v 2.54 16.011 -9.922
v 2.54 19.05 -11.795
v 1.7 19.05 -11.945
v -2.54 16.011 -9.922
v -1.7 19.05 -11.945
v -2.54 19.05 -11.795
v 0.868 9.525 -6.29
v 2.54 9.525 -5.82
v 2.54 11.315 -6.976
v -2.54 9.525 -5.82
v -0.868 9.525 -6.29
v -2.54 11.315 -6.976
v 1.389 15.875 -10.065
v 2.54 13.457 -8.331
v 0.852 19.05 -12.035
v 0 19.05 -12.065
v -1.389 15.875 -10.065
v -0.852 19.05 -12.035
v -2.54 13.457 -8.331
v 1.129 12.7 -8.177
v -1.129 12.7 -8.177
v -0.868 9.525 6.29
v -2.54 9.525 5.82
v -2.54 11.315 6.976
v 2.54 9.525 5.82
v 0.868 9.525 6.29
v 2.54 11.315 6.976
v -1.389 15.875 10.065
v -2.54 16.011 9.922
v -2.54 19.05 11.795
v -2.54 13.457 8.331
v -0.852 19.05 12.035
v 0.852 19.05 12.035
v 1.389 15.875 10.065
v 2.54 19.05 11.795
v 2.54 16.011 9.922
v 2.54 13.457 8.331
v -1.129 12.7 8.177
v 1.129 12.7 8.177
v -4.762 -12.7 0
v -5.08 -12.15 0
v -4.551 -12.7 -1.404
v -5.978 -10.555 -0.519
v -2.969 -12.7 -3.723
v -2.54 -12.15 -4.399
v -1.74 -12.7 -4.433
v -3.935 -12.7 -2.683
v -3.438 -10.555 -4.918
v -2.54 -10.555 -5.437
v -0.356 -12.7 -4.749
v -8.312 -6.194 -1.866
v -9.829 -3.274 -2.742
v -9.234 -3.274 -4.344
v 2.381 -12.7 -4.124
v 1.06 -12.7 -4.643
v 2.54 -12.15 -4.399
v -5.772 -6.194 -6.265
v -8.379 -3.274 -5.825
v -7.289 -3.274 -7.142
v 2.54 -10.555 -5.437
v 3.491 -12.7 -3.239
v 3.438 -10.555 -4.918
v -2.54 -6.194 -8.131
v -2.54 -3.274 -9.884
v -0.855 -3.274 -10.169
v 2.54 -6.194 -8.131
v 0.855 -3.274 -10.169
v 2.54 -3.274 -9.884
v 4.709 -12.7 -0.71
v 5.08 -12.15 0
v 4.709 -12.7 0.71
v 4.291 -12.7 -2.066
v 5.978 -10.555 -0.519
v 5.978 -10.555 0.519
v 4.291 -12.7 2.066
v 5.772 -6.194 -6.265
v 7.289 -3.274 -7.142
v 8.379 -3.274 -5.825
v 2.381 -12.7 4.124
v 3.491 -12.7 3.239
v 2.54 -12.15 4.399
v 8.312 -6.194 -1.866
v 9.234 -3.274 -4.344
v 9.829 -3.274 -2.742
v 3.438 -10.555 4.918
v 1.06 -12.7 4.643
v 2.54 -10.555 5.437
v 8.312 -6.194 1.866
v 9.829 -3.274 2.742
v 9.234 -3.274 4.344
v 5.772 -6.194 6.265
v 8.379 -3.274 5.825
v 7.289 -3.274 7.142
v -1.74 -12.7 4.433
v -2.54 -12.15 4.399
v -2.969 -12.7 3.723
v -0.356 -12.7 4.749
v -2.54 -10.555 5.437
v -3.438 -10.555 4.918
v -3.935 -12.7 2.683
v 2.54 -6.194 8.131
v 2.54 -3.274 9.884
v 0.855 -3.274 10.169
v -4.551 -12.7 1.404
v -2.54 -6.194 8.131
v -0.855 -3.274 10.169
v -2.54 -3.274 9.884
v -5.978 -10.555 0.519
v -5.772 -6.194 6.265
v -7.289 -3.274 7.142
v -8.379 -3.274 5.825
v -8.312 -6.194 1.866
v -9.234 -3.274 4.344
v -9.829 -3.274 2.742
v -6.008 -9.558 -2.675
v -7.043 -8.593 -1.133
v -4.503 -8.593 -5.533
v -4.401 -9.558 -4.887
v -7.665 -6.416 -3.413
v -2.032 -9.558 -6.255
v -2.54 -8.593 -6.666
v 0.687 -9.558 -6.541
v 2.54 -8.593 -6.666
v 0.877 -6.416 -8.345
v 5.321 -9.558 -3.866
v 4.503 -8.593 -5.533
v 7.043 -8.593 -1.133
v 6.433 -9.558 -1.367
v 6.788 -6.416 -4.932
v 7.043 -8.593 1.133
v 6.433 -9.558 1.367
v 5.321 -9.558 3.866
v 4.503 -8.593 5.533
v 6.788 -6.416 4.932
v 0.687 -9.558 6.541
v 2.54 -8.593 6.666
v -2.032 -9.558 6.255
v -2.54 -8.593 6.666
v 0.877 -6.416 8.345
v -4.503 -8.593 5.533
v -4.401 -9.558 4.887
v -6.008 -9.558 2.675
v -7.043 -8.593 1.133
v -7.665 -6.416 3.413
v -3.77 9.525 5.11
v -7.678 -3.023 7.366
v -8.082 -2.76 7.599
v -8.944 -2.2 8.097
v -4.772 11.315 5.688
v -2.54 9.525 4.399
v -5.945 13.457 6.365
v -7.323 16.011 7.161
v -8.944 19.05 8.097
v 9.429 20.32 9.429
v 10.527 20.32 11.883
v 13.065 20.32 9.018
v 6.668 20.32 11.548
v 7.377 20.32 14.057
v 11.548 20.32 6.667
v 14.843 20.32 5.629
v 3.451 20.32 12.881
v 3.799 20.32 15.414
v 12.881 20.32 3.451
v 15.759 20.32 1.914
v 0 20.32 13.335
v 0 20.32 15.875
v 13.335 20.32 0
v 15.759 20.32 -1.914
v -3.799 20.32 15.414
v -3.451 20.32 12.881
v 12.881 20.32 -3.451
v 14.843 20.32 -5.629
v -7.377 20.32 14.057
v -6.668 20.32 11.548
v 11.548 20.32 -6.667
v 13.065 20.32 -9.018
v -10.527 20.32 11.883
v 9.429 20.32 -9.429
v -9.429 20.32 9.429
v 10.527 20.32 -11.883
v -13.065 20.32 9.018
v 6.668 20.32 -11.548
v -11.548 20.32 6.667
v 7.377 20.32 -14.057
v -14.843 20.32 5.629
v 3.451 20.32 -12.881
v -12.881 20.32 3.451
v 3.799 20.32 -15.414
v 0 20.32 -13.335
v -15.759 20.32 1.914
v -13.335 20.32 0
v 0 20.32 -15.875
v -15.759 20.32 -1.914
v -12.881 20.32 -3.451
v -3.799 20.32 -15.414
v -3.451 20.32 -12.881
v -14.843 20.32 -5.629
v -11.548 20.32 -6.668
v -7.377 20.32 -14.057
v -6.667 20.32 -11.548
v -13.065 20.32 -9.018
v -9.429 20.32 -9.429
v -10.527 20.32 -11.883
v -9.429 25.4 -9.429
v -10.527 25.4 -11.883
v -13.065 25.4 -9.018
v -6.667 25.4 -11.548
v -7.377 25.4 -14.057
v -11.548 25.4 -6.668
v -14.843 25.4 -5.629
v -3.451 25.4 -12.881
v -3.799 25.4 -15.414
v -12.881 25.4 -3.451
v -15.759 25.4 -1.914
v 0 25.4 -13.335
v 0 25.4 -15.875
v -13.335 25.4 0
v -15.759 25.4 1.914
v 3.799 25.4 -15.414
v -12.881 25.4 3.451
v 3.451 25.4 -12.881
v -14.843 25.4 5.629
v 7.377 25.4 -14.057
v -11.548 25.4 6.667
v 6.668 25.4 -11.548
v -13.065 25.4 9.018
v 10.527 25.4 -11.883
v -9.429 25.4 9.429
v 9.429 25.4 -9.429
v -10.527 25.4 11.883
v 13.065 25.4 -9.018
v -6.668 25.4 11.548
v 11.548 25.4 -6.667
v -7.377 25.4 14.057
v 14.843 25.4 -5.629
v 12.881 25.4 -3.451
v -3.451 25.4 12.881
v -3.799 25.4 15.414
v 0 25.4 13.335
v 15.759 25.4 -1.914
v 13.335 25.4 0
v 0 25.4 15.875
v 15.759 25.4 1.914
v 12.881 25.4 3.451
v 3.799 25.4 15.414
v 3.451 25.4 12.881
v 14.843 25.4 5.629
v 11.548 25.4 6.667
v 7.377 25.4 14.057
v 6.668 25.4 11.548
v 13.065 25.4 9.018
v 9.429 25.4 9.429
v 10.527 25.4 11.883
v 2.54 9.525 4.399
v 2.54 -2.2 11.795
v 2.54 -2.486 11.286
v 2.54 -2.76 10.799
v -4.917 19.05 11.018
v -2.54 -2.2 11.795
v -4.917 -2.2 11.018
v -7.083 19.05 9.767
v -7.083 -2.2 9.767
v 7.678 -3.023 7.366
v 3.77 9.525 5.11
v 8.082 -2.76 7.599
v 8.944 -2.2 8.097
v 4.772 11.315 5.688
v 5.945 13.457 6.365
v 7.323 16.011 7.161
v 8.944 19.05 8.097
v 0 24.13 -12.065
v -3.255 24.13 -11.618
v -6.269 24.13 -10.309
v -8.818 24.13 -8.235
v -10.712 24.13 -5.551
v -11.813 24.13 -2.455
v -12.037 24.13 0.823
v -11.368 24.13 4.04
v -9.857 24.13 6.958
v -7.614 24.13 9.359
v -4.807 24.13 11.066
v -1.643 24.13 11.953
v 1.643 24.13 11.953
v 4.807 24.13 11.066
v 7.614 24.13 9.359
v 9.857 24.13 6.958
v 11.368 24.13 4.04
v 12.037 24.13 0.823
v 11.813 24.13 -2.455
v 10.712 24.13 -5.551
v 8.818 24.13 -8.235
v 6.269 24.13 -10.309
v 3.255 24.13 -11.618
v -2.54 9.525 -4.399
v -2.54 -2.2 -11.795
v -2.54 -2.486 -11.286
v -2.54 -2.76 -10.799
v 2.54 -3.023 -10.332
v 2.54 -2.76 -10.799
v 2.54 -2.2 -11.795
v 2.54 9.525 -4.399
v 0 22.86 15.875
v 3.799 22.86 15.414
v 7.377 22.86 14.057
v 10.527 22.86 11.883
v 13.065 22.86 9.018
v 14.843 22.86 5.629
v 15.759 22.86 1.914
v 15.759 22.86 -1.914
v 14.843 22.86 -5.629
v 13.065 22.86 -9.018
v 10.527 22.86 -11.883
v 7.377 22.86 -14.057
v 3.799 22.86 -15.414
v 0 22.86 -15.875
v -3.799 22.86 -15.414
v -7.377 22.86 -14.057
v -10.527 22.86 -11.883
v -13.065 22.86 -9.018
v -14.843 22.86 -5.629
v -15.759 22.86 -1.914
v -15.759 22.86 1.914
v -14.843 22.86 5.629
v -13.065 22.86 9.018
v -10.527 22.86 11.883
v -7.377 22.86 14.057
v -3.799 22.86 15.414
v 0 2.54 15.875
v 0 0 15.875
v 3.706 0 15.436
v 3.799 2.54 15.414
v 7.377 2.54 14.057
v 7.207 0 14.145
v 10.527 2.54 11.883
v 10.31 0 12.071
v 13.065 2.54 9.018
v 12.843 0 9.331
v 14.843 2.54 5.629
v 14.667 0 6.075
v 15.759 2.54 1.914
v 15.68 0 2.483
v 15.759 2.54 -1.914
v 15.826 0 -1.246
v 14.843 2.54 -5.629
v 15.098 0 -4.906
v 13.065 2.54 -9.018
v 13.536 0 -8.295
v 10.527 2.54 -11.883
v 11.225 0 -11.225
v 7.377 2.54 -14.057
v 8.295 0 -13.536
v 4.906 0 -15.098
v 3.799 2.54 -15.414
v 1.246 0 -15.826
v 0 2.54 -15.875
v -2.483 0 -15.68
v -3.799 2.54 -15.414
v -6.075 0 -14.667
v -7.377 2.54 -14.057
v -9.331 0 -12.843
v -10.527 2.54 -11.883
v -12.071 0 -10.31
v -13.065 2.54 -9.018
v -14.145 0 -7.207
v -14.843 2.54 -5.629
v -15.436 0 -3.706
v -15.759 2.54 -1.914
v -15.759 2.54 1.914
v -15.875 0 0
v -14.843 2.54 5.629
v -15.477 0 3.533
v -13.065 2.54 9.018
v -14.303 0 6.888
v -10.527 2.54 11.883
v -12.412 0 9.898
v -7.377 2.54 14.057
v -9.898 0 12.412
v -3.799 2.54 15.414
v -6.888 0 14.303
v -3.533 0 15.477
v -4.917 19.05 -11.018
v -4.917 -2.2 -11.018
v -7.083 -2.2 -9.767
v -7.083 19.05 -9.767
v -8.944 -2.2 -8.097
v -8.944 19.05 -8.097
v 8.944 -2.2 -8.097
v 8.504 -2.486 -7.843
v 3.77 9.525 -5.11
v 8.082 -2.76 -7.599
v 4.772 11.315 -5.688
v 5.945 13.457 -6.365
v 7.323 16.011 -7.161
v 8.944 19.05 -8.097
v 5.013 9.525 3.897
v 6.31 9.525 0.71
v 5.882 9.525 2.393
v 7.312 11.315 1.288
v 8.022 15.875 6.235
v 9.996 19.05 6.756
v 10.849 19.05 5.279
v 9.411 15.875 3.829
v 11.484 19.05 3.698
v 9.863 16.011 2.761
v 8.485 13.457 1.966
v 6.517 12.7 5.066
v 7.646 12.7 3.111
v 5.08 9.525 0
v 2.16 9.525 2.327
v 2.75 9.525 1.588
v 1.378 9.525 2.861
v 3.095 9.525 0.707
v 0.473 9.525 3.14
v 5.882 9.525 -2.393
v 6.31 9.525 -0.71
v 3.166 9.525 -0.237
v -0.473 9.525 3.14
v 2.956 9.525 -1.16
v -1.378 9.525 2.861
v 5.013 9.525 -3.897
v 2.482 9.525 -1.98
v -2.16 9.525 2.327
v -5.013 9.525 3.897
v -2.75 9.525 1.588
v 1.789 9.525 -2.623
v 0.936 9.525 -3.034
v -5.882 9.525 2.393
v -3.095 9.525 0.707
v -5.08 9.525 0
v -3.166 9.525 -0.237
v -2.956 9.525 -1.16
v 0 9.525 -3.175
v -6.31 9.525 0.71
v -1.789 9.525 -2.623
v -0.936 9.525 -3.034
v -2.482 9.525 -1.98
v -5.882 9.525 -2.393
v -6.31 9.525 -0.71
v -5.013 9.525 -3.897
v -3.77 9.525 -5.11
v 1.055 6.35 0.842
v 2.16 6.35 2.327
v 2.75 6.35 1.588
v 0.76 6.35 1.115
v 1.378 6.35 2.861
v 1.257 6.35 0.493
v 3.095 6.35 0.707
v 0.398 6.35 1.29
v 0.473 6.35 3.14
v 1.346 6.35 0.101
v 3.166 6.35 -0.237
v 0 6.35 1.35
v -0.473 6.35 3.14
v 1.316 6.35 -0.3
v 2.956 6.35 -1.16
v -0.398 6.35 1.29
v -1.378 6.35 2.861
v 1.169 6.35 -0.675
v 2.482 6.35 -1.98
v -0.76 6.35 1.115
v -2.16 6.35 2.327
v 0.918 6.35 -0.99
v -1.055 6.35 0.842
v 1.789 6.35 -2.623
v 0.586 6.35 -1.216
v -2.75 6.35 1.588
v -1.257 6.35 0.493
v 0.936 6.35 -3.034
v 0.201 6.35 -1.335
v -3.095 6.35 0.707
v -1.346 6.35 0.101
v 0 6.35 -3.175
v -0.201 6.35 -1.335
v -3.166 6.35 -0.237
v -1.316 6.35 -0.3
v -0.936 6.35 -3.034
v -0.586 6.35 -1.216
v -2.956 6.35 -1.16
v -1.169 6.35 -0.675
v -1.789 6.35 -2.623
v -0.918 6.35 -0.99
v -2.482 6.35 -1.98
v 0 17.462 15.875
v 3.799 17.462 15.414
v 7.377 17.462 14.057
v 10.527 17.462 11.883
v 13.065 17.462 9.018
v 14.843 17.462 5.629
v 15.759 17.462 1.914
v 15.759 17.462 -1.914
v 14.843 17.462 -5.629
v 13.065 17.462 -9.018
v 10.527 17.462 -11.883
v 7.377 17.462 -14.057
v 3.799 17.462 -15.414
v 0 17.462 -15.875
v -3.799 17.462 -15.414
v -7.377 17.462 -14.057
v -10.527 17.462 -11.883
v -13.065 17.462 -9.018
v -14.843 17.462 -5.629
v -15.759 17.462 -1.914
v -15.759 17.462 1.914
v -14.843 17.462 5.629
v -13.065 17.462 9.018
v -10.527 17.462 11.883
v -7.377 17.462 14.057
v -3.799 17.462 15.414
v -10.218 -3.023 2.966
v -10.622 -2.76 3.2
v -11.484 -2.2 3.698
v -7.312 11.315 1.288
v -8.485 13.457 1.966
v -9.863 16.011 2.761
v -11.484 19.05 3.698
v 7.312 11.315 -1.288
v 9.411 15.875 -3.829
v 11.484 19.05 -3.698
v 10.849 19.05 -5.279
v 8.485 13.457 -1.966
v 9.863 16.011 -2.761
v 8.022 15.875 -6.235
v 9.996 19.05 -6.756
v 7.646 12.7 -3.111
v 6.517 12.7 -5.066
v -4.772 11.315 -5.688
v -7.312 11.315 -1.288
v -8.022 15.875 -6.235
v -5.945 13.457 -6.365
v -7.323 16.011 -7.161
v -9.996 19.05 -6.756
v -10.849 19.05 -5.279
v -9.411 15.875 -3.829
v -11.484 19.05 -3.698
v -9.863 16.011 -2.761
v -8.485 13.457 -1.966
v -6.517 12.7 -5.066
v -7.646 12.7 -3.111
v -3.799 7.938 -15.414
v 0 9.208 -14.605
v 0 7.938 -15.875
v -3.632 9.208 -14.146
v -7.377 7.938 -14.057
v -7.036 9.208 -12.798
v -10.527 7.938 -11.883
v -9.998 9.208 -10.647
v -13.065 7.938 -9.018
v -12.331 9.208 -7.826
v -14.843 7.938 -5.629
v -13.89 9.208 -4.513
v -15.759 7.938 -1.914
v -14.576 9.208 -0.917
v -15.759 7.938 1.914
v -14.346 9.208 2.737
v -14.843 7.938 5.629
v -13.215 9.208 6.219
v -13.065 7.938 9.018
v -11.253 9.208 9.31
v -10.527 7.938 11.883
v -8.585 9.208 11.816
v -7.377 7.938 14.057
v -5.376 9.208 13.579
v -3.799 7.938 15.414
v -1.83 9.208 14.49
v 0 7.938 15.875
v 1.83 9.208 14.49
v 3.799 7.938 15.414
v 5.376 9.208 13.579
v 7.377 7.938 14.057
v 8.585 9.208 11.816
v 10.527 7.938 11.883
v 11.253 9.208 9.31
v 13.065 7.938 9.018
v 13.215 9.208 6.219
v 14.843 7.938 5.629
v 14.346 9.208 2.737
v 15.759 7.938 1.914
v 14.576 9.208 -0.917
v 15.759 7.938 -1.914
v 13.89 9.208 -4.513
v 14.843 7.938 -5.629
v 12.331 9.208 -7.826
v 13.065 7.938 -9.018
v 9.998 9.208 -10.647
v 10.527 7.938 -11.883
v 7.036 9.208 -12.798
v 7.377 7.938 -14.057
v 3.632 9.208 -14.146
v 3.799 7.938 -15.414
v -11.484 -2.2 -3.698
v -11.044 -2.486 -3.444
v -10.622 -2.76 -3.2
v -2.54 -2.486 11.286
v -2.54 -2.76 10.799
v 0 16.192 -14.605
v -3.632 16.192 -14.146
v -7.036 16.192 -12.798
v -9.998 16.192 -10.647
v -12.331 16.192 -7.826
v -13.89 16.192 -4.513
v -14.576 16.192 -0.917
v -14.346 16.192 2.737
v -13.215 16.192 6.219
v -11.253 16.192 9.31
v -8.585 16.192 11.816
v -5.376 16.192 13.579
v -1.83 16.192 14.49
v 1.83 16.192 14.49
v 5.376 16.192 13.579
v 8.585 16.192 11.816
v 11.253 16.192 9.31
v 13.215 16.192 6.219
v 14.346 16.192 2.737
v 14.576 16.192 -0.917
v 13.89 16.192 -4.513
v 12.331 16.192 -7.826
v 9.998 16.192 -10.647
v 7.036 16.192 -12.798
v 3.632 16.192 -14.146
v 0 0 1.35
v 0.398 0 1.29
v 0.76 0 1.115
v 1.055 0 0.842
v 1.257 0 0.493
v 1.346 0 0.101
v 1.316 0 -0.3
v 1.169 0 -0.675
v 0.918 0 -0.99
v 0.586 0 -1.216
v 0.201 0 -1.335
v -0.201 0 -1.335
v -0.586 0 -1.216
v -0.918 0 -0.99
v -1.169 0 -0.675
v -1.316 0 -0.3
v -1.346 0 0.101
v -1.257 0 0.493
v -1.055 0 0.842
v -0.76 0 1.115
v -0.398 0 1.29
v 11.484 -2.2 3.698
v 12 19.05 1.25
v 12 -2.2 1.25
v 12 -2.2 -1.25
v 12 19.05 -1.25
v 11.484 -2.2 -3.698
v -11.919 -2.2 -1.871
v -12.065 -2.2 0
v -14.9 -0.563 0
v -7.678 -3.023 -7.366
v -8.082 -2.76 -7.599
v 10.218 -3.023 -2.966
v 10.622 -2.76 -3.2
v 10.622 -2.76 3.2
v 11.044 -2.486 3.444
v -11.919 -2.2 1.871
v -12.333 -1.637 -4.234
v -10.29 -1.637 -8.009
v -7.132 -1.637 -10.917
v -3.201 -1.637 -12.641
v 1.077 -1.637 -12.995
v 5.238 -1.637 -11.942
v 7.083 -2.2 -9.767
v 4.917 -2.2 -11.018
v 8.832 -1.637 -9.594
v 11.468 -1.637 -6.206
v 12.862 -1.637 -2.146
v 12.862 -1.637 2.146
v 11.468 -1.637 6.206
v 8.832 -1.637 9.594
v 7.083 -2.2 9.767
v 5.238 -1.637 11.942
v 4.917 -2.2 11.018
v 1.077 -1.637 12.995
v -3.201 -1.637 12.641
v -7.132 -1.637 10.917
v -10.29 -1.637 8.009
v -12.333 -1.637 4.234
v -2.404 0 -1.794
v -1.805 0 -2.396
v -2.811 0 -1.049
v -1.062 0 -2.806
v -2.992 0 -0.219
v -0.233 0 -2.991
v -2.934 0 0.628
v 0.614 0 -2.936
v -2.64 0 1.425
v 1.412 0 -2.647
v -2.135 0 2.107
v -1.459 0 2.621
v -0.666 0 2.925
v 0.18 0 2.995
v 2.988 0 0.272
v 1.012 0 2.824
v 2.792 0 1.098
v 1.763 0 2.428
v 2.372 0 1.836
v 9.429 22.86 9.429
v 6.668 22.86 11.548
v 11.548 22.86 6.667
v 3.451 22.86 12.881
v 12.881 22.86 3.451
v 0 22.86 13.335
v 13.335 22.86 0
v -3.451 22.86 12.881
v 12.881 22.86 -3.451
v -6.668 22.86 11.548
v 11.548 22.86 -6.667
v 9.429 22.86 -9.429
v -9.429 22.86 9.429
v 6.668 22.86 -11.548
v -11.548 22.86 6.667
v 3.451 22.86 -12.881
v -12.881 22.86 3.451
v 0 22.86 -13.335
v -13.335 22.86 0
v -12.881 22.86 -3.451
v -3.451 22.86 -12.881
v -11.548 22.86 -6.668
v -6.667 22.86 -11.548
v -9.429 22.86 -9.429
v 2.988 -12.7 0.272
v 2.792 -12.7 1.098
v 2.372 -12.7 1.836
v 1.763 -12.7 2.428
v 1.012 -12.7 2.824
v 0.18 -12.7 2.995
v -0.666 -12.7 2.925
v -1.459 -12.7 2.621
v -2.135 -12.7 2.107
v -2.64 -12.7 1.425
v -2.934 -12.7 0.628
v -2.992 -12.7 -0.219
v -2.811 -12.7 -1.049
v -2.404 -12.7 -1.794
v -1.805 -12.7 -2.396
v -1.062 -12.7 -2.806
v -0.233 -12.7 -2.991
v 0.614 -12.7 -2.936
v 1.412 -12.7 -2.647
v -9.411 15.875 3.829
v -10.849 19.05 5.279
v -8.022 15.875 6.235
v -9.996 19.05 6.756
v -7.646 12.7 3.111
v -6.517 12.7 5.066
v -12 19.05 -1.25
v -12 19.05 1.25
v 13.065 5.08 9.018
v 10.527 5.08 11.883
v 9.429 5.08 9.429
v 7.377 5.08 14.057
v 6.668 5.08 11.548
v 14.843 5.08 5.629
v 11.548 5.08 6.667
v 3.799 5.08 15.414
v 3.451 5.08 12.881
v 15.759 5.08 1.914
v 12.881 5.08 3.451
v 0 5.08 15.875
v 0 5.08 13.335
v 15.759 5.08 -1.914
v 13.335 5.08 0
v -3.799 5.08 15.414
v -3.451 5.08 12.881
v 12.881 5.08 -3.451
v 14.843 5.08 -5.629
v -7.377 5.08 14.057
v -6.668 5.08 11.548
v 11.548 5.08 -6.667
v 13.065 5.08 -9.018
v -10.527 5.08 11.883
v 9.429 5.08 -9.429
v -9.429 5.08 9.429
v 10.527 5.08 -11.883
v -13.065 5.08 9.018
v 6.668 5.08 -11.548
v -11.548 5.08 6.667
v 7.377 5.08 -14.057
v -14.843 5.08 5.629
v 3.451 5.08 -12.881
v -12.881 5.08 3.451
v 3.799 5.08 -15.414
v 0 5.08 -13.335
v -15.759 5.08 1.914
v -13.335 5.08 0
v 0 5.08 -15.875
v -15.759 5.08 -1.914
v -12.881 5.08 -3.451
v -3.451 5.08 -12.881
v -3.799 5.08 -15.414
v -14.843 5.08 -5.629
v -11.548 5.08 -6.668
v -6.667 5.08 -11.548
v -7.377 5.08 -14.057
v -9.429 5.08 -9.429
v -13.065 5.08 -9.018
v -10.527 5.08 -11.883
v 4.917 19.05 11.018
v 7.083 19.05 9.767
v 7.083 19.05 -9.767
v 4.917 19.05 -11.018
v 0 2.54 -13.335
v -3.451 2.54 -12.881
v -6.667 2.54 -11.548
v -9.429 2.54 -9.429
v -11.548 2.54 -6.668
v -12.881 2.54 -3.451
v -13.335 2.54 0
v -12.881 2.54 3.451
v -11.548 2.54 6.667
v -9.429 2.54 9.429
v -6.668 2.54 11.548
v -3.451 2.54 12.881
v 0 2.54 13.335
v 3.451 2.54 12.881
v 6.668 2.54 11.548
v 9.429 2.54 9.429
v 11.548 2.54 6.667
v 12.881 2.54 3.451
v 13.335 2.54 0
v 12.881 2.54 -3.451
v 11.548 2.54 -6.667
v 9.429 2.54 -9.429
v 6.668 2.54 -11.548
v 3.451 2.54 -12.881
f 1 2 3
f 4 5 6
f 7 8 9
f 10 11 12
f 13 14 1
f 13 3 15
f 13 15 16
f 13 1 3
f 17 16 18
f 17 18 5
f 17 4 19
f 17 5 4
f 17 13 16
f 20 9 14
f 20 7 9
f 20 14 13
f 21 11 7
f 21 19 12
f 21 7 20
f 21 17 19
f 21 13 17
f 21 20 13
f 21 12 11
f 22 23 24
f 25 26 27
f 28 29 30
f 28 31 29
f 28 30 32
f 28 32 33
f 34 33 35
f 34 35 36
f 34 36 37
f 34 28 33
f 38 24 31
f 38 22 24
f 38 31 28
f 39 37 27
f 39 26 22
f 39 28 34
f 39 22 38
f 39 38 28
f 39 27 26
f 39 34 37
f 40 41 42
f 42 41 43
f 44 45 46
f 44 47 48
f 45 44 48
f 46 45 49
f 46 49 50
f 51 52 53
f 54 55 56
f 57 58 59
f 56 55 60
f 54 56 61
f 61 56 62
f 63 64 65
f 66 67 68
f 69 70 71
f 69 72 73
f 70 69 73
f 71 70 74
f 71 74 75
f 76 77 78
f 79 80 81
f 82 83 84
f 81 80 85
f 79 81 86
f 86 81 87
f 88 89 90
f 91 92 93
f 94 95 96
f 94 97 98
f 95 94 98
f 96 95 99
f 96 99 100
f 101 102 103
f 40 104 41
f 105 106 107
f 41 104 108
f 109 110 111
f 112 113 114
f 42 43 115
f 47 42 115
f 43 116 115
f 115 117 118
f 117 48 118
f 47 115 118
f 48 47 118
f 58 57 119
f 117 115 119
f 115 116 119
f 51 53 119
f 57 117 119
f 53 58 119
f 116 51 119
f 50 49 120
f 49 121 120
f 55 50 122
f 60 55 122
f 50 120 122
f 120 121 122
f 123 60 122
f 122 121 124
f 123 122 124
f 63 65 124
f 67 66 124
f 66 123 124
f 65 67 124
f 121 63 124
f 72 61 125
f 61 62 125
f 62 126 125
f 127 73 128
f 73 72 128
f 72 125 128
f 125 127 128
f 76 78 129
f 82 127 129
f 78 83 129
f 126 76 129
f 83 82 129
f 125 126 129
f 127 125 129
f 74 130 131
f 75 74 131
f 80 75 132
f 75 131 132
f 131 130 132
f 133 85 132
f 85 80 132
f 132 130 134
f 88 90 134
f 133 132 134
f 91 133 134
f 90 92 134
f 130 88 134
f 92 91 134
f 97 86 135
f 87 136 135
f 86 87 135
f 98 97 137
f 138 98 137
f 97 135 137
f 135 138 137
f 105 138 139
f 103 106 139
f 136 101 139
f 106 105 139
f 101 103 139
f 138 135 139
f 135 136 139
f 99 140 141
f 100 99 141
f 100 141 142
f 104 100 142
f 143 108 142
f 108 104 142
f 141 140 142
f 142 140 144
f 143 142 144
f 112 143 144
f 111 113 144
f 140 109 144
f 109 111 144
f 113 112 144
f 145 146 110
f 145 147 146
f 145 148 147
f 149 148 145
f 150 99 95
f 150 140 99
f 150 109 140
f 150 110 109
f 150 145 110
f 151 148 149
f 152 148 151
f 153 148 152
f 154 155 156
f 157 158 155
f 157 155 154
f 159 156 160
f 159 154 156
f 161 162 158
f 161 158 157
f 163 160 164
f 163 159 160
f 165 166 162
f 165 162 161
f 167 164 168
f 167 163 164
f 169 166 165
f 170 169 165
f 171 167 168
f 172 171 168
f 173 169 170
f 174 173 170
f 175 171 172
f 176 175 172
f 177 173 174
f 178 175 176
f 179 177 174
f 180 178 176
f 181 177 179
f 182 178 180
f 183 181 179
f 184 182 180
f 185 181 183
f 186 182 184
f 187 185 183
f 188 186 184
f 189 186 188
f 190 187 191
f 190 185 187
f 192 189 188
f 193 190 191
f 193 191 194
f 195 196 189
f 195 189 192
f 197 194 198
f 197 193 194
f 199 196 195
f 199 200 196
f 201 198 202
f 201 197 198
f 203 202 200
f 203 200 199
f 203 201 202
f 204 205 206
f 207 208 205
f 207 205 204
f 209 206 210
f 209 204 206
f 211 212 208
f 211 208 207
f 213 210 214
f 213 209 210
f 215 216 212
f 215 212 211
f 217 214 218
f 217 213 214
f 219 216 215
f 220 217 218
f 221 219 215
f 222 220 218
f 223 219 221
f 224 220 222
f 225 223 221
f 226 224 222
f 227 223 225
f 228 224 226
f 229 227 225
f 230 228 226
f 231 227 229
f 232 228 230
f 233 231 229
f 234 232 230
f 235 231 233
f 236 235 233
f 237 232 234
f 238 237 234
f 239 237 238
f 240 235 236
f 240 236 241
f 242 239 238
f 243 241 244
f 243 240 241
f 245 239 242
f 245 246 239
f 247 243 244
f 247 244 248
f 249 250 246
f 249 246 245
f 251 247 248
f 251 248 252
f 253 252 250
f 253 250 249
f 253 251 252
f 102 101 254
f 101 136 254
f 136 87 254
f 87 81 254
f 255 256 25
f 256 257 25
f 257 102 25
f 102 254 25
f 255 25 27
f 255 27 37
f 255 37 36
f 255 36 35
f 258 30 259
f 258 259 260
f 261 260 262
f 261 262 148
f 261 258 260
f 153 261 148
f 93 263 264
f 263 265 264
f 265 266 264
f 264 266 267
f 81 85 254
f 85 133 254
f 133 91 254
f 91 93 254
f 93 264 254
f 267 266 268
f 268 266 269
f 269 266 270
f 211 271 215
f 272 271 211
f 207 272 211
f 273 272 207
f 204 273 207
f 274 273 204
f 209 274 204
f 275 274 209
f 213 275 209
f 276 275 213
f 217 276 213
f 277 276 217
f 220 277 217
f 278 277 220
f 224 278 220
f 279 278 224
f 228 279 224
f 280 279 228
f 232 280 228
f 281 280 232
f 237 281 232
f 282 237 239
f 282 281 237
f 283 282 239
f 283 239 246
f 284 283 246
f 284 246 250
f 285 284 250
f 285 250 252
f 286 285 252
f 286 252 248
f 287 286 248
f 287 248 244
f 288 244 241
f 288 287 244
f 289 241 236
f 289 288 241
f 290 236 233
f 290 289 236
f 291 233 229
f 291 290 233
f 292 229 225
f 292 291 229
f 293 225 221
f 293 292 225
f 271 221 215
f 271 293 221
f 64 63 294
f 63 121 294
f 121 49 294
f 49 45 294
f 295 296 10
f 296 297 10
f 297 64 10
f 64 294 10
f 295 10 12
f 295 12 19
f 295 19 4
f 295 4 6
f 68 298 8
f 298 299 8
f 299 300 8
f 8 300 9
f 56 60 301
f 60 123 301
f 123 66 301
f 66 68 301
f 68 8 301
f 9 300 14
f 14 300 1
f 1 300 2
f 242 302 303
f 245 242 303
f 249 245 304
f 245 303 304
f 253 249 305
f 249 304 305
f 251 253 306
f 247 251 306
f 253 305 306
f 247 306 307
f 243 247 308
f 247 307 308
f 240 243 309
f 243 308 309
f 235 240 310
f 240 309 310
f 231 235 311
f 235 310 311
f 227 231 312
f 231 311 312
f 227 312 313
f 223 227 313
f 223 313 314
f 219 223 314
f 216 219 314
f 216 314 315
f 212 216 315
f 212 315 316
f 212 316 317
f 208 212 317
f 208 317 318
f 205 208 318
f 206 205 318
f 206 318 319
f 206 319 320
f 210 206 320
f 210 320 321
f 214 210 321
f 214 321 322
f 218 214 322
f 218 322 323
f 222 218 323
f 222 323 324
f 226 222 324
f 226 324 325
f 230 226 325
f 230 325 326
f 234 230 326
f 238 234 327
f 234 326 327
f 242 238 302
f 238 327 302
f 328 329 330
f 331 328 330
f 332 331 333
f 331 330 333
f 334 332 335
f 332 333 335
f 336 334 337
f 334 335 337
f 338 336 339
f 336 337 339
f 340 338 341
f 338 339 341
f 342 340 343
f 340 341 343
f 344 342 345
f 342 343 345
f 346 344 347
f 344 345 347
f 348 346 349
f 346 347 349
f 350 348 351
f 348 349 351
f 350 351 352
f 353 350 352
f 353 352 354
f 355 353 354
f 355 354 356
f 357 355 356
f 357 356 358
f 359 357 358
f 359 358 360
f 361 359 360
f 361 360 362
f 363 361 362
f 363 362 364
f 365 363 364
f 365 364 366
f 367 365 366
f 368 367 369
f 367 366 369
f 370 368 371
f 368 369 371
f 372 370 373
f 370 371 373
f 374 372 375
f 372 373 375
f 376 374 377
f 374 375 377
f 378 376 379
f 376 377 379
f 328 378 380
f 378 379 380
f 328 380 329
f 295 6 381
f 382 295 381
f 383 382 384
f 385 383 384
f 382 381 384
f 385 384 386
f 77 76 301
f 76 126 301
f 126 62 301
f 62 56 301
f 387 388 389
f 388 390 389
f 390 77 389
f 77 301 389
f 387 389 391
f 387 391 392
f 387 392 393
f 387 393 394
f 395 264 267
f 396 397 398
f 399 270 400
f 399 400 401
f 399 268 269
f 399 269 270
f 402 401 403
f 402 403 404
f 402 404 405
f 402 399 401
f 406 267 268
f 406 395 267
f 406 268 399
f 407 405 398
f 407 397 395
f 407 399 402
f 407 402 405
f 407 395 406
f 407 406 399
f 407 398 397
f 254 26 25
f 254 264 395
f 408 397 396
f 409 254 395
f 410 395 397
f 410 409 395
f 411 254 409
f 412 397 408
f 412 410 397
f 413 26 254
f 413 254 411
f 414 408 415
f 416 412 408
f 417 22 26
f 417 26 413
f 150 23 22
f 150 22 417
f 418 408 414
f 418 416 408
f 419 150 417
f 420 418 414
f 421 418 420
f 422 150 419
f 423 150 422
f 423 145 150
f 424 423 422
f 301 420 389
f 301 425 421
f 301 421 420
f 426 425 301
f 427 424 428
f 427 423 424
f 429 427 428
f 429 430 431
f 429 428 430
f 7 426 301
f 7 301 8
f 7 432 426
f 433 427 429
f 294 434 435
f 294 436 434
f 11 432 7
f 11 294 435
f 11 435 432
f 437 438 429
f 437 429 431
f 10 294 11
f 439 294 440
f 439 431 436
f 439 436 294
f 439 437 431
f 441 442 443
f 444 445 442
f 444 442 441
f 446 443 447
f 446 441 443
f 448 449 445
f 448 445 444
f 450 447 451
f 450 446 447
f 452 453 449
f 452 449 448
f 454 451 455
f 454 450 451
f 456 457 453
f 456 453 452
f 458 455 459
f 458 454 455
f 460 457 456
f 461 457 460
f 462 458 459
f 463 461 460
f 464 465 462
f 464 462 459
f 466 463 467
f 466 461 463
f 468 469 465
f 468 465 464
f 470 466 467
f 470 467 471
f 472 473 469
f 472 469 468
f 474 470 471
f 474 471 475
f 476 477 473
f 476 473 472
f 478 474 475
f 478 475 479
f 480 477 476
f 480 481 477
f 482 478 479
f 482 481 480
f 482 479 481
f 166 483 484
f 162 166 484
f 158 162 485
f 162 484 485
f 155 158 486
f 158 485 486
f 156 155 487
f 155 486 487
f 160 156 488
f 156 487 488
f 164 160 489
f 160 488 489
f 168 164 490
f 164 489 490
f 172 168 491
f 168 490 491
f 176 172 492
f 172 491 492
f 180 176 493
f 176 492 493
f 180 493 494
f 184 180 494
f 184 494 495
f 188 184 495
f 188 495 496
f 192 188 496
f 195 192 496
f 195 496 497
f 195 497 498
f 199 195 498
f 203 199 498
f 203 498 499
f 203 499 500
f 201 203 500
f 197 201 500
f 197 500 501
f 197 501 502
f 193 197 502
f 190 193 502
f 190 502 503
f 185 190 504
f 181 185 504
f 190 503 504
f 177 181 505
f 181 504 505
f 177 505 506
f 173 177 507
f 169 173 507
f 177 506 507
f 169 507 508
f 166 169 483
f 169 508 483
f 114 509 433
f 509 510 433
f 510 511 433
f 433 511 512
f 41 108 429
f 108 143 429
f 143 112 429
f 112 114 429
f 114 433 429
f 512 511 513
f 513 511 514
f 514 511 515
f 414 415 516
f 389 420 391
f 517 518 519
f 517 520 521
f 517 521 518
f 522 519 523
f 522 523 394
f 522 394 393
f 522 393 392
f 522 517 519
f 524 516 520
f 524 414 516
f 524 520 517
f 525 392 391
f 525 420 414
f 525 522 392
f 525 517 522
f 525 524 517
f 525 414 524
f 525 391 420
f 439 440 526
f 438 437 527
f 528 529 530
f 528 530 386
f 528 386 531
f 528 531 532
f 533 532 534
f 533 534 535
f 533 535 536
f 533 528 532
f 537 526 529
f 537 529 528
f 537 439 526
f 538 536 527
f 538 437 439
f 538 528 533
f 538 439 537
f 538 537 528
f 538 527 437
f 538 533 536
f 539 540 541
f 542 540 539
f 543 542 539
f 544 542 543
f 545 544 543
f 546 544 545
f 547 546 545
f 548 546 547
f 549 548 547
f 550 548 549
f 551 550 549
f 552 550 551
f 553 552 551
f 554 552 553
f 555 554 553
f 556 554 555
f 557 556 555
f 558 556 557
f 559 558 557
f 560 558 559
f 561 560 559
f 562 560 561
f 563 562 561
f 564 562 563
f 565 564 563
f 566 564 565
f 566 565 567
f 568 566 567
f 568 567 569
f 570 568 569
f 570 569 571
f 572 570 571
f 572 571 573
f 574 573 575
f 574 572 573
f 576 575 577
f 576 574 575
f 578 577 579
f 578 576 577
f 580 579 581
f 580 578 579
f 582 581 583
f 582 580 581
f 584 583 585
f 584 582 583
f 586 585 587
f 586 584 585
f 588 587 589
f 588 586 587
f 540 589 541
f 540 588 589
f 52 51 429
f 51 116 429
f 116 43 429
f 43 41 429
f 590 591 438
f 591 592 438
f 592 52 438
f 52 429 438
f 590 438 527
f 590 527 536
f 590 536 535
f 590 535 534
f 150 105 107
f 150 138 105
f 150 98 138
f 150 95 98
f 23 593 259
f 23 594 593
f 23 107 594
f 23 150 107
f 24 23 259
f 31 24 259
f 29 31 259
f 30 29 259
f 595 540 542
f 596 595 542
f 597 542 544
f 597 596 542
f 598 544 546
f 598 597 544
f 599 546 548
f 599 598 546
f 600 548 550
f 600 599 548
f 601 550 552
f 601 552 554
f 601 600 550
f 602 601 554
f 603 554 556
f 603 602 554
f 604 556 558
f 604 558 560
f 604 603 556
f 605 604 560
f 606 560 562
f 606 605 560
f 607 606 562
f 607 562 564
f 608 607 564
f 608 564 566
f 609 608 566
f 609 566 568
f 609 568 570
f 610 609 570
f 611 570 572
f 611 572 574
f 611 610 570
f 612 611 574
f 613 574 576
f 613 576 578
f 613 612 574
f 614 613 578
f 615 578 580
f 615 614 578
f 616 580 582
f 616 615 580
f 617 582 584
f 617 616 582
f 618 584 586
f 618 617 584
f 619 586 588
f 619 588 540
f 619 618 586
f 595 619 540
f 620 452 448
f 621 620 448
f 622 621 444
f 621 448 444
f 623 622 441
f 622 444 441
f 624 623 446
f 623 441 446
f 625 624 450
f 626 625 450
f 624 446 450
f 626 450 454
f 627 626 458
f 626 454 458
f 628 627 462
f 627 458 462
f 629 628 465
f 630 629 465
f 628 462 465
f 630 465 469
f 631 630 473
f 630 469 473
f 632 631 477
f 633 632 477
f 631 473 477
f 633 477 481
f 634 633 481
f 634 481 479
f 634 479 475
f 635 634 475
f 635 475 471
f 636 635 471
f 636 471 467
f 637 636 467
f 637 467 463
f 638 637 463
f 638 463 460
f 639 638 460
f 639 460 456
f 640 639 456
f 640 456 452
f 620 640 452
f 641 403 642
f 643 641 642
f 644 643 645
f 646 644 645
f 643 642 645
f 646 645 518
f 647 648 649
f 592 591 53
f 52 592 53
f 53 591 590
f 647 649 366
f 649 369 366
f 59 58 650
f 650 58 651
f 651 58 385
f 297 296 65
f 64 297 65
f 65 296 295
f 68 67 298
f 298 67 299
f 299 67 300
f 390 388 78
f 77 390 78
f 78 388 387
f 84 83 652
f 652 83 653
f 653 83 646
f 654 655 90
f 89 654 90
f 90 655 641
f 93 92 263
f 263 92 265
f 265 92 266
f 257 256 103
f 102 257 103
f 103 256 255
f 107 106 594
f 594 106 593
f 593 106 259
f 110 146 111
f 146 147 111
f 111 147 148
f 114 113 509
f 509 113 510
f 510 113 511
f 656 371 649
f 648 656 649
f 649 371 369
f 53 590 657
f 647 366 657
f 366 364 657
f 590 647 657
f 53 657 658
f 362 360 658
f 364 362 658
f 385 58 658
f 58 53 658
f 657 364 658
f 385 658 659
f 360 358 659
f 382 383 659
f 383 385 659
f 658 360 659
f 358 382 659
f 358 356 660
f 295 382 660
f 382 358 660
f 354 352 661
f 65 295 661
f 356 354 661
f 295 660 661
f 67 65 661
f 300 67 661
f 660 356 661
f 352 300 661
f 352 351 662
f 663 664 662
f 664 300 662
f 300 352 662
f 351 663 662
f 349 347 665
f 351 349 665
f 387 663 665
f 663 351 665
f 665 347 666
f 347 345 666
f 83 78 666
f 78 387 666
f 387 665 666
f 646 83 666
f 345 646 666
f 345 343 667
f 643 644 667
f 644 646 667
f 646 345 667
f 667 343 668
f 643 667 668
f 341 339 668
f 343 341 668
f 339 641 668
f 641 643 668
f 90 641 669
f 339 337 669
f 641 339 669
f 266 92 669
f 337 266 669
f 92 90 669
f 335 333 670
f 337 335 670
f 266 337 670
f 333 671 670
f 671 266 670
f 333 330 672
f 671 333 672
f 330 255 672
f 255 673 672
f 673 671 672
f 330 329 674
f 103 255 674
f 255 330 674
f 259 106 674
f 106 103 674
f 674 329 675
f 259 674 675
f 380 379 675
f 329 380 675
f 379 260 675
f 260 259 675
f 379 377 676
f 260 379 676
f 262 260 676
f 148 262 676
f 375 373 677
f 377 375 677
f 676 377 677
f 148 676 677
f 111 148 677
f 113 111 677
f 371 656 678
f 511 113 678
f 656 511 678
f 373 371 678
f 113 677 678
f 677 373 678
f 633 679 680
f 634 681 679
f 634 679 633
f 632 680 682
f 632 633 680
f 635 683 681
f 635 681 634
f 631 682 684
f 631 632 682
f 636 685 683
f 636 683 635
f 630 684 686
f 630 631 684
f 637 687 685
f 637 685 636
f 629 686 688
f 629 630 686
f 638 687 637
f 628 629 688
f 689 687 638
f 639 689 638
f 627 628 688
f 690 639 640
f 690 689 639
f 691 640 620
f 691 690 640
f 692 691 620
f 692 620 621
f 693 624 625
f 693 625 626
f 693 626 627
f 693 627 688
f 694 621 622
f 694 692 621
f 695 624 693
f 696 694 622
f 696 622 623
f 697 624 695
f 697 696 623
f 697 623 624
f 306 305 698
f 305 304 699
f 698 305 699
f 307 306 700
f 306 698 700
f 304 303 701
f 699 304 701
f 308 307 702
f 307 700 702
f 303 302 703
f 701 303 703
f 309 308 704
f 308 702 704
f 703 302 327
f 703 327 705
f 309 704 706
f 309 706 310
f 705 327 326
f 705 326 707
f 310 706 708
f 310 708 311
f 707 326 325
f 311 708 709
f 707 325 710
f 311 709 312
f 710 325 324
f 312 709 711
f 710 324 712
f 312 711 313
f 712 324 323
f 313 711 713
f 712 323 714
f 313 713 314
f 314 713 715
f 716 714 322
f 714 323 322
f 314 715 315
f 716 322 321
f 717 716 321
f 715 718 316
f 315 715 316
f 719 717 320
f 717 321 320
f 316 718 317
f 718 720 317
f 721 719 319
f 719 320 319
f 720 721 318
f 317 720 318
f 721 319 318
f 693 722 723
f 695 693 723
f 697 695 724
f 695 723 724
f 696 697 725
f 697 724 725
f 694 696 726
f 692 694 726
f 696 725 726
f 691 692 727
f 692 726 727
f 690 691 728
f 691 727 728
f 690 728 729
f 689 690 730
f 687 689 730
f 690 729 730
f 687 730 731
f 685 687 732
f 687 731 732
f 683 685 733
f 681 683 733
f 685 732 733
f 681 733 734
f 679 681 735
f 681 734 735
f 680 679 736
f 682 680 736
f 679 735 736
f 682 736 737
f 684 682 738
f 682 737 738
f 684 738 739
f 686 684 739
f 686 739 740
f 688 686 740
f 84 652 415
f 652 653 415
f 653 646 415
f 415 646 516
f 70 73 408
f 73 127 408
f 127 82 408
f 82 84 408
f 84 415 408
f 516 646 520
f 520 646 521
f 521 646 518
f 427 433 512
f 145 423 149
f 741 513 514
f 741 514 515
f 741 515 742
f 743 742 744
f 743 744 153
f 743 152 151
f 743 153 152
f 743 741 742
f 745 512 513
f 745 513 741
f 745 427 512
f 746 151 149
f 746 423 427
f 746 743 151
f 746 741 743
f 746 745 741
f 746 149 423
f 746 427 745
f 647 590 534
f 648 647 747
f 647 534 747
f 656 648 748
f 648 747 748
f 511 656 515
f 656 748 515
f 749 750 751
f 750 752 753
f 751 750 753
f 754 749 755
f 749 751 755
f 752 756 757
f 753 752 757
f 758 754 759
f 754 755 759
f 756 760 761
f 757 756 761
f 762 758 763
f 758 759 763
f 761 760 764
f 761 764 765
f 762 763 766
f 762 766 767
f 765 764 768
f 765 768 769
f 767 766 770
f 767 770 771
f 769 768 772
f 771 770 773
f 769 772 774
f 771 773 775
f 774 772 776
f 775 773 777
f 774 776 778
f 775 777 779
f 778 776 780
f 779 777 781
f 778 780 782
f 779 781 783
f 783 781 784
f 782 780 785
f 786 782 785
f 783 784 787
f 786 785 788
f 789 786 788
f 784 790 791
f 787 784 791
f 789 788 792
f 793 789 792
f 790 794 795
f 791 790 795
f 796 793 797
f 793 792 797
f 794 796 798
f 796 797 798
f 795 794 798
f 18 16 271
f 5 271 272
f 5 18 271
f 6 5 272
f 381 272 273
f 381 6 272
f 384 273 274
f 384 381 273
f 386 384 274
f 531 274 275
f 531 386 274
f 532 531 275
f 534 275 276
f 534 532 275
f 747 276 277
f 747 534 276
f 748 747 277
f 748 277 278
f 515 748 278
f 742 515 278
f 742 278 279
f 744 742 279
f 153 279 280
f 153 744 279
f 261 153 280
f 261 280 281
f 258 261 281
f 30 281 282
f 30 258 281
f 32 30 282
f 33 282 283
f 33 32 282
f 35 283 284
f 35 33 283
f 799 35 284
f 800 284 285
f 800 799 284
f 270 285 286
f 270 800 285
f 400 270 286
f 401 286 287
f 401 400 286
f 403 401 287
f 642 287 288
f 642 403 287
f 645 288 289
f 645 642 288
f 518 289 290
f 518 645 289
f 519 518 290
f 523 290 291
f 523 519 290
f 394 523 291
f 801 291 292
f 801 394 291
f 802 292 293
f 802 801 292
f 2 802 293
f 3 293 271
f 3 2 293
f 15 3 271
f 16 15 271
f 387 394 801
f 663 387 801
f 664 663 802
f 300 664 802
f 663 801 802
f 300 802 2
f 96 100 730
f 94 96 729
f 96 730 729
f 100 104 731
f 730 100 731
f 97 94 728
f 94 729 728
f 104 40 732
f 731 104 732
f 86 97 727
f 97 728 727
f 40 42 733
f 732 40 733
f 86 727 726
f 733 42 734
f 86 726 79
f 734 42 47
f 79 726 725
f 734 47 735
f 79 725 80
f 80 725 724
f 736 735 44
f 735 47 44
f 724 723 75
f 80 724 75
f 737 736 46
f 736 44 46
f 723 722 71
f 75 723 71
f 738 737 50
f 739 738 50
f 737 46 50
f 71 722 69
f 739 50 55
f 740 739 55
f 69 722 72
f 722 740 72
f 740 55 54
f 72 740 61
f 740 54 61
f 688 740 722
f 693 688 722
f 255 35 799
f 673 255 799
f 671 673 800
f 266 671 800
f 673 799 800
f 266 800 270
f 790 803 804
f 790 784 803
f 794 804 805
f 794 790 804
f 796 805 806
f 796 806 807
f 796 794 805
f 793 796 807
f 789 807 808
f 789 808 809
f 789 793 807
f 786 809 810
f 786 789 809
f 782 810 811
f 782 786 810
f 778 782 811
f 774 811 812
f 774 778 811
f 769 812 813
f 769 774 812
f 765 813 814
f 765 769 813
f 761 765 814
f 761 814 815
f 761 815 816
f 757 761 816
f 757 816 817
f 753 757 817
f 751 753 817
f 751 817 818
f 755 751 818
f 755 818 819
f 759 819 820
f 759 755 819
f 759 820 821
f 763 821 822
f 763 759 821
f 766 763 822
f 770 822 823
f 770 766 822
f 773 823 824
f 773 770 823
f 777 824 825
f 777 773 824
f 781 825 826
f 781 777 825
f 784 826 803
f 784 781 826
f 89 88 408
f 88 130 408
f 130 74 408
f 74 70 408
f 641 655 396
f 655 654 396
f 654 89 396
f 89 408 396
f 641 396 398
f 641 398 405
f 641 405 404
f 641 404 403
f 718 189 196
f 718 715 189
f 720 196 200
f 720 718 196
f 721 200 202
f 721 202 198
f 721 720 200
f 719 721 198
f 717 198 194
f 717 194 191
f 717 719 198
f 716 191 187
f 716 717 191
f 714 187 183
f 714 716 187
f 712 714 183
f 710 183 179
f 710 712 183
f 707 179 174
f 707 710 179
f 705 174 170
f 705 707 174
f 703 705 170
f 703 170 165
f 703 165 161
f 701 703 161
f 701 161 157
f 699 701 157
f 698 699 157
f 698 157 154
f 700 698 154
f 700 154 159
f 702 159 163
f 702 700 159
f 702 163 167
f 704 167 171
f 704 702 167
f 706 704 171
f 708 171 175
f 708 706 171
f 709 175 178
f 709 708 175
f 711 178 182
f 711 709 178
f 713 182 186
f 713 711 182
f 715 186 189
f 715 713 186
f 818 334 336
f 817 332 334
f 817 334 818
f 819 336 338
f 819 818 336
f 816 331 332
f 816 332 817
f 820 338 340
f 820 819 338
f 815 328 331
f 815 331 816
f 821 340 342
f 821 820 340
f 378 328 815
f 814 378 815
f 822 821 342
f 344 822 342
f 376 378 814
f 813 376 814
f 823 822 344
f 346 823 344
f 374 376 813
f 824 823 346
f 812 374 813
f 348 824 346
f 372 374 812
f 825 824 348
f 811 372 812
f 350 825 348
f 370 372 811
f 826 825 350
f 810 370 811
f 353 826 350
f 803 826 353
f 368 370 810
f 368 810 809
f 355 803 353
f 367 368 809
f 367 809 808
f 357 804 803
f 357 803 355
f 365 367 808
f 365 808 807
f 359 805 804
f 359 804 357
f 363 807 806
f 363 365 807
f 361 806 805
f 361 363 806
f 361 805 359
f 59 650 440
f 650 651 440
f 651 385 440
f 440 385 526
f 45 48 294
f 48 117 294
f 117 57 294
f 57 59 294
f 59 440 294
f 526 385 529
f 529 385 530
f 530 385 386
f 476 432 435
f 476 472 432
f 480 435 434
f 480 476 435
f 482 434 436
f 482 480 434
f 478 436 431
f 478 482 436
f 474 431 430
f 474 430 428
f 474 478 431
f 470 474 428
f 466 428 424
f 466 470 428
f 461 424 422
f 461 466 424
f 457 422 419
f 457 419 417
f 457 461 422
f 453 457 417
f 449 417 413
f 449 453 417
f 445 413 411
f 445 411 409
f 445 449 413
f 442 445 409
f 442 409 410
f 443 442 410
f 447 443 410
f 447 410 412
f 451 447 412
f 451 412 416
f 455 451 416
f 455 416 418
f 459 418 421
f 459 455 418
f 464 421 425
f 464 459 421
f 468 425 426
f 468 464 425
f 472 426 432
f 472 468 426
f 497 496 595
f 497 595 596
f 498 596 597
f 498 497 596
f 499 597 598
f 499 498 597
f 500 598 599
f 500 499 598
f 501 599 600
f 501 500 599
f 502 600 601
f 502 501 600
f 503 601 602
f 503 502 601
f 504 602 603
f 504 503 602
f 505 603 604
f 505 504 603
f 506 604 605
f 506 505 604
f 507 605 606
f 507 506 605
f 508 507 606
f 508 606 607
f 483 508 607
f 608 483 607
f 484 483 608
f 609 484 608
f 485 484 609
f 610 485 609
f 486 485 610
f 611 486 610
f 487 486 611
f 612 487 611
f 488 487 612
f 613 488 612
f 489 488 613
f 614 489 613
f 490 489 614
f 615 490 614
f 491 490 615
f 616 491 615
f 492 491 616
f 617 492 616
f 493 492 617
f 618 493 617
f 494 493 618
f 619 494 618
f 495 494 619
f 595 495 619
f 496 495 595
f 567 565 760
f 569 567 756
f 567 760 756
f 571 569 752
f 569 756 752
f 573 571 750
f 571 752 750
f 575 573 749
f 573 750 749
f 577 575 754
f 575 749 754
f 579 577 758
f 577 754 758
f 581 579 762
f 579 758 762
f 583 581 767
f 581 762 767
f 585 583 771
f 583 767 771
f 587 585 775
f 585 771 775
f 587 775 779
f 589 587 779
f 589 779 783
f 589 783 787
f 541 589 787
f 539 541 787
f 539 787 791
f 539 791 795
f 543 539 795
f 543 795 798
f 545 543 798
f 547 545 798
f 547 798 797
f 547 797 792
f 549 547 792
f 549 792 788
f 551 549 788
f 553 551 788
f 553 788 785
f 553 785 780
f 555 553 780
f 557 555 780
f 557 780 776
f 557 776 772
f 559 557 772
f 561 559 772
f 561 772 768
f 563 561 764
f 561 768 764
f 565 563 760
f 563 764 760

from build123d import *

# Parameters (mm, degrees)
SKETCH1_R           = 15.875
BOSS_EXTRUDE1_DEPTH = 25.4
SKETCH2_R           = 1.35
CUT_EXTRUDE2_DEPTH  = 25.4
CUT_EXTRUDE3_DEPTH  = 12.7
CUT_EXTRUDE5_DEPTH  = 39.885649667
SKETCH7_W           = 2.54
SKETCH7_H           = 2.54


with BuildPart() as part:
    # Sketch1 → Boss-Extrude1 (new body)
    with BuildSketch(Plane(origin=(0, 0, 0), x_dir=(1, 0, 0), z_dir=(0, 1, 0))):
        with Locations(Location((0, 0, 0), (0, 0, 270))):
            Circle(SKETCH1_R)
    extrude(amount=BOSS_EXTRUDE1_DEPTH)

    # Sketch2 → Cut-Extrude2 (cut)
    with BuildSketch(Plane(origin=(0, 25.4, 0), x_dir=(1, 0, 0), z_dir=(0, 1, 0))):
        with Locations(Location((0, 0, 0), (0, 0, 270))):
            Circle(SKETCH2_R)
    extrude(amount=-CUT_EXTRUDE2_DEPTH, mode=Mode.SUBTRACT)

    # Sketch3 → Revolve2 (revolve)
    with BuildSketch(Plane.XY):
        Polygon((0, 0), (0, -12.7), (-4.7625, -12.7), (-10.204772628, -3.2737073), (-15.875, 0), align=None)
    revolve(axis=Axis((0, 0, 0), (0, -1, 0)))

    # Sketch4 → Cut-Extrude3 (cut)
    with BuildSketch(Plane.XZ.offset(12.7)):
        with BuildLine():
            Line((1.412444273, -2.646696276), (2.987644573, 0.271992474))
            ThreePointArc((2.987644573, 0.271992474), (-2.640053308, 1.424822281), (1.412444273, -2.646696276))
        make_face()
    extrude(amount=-CUT_EXTRUDE3_DEPTH, mode=Mode.SUBTRACT)

    # Sketch5 → Cut-Revolve1 (revolve, cut)
    with BuildSketch(Plane.XY, mode=Mode.PRIVATE) as cut_revolve1_sk:
        Polygon((-12.065, 24.13), (-12.065, 19.05), (-6.35, 9.525), (-3.175, 9.525), (-3.175, 6.35), (0, 6.35), (0, 25.4), (-13.335, 25.4), align=None)
    revolve(cut_revolve1_sk.sketch.rotate(Axis((0, 6.35, 0), (0, 1, 0)), 270), axis=Axis((0, 6.35, 0), (0, 1, 0)), mode=Mode.SUBTRACT)

    # Sketch6 → Cut-Extrude5 (cut, through all)
    with BuildSketch(Plane(origin=(0, 19.05, 0), x_dir=(1, 0, 0), z_dir=(0, 1, 0))):
        with BuildLine():
            Line((-5.08, 0), (-11.484424543, 3.697596234))
            ThreePointArc((-11.484424543, 3.697596234), (-12.065, 0), (-11.484424543, -3.697596234))
            Line((-11.484424543, -3.697596234), (-5.08, 0))
        make_face()
        with BuildLine():
            Line((-2.54, 4.399409051), (-2.54, 11.794601519))
            ThreePointArc((-2.54, 11.794601519), (-6.0325, 10.448596497), (-8.944424543, 8.097005285))
            Line((-8.944424543, 8.097005285), (-2.54, 4.399409051))
        make_face()
        with BuildLine():
            Line((2.54, 4.399409051), (8.944424543, 8.097005285))
            ThreePointArc((8.944424543, 8.097005285), (6.0325, 10.448596497), (2.54, 11.794601519))
            Line((2.54, 11.794601519), (2.54, 4.399409051))
        make_face()
        with BuildLine():
            Line((5.08, 0), (11.484424543, -3.697596234))
            ThreePointArc((11.484424543, -3.697596234), (12.065, 0), (11.484424543, 3.697596234))
            Line((11.484424543, 3.697596234), (5.08, 0))
        make_face()
        with BuildLine():
            Line((2.54, -4.399409051), (2.54, -11.794601519))
            ThreePointArc((2.54, -11.794601519), (6.0325, -10.448596497), (8.944424543, -8.097005285))
            Line((8.944424543, -8.097005285), (2.54, -4.399409051))
        make_face()
        with BuildLine():
            Line((-8.944424543, -8.097005285), (-2.54, -4.399409051))
            Line((-2.54, -4.399409051), (-2.54, -11.794601519))
            ThreePointArc((-2.54, -11.794601519), (-6.0325, -10.448596497), (-8.944424543, -8.097005285))
        make_face()
    extrude(amount=-CUT_EXTRUDE5_DEPTH, mode=Mode.SUBTRACT)

    # Sketch7 → Cut-Revolve2 (revolve, cut)
    with BuildSketch(Plane.XY, mode=Mode.PRIVATE) as cut_revolve2_sk:
        with Locations((-14.605, 21.59)):
            Rectangle(SKETCH7_W, SKETCH7_H)
        with Locations((-14.605, 3.81)):
            Rectangle(SKETCH7_W, SKETCH7_H)
        Polygon((-15.875, 17.4625), (-15.875, 7.9375), (-14.605, 9.2075), (-14.605, 16.1925), align=None)
    revolve(cut_revolve2_sk.sketch.rotate(Axis((0, 0, 0), (0, 1, 0)), 270), axis=Axis((0, 0, 0), (0, 1, 0)), mode=Mode.SUBTRACT)


solid = part.part
